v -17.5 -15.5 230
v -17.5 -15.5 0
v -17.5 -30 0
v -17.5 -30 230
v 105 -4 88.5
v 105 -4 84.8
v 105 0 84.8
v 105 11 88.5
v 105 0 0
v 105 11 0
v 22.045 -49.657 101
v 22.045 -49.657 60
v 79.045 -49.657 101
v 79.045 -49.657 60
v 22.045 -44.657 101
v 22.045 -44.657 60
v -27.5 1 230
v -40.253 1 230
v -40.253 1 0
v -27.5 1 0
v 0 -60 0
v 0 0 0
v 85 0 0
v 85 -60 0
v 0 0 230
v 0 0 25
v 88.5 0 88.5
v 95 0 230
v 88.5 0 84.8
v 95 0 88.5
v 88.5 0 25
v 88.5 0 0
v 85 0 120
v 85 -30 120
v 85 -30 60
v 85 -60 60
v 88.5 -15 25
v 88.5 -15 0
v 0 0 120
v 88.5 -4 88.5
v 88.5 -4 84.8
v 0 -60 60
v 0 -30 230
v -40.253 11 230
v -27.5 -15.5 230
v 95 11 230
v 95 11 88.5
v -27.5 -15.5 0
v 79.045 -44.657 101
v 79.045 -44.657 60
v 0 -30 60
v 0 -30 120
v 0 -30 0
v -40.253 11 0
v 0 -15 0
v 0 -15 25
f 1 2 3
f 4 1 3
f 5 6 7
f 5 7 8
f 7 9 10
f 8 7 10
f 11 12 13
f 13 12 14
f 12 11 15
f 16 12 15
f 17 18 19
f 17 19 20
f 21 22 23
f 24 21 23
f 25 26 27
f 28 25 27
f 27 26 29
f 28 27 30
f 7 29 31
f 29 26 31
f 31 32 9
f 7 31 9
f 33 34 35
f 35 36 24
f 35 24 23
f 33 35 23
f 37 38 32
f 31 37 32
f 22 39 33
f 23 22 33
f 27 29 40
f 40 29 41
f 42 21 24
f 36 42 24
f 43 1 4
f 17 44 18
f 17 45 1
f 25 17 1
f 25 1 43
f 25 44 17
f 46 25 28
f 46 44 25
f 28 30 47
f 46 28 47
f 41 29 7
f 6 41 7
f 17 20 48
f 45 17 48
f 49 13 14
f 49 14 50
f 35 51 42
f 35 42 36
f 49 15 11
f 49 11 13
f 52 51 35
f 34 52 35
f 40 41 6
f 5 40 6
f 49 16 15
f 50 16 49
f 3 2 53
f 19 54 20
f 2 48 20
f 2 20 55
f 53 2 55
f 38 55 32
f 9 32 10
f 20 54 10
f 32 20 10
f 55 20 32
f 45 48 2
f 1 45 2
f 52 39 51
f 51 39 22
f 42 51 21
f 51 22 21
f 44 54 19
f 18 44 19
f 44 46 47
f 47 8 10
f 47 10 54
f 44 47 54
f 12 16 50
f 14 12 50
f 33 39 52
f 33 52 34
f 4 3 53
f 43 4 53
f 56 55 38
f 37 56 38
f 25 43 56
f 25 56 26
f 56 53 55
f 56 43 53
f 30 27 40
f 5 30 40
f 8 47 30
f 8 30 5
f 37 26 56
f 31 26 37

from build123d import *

# Parameters (mm, degrees)
F0_W     = 10
F0_H     = 11
F1_DEPTH = 88.5
F2_START = 84.8
F2_DEPTH = 3.7
F3_DEPTH = 230
F4_DEPTH = 25
F5_W     = 85
F5_H     = 30
F6_DEPTH = 60
F7_DEPTH = 120
F8_W     = 57
F8_H     = 5
F9_DEPTH = 41


with BuildPart() as f1:
    # F0 (on Top) → F1 (new body)
    with BuildSketch(Plane.XY):
        Polygon((0, -15), (0, 0), (88.5, 0), (95, 0), (95, 11), (-40.2532453754, 11), (-40.2532453754, 1), (-27.5, 1), (-27.5, -15.5), (-17.5, -15.5), (-17.5, -30), (0, -30), align=None)
        with Locations((100, 5.5)):
            Rectangle(F0_W, F0_H)
    extrude(amount=F1_DEPTH)

    # F0 (on Top) → F2 (join)
    with BuildSketch(Plane.XY.offset(F2_START)):
        Polygon((95, 0), (88.5, 0), (88.5, -4), (105, -4), (105, 0), align=None)
    extrude(amount=F2_DEPTH)

    # F0 (on Top) → F3 (join)
    with BuildSketch(Plane.XY):
        Polygon((0, -15), (0, 0), (88.5, 0), (95, 0), (95, 11), (-40.2532453754, 11), (-40.2532453754, 1), (-27.5, 1), (-27.5, -15.5), (-17.5, -15.5), (-17.5, -30), (0, -30), align=None)
    extrude(amount=F3_DEPTH)

    # F0 (on Top) → F4 (join)
    with BuildSketch(Plane.XY):
        Polygon((88.5, 0), (0, 0), (0, -15), (88.5, -15), (88.5, -4), align=None)
    extrude(amount=F4_DEPTH)


with BuildPart() as f6:
    # F5 (on Top) → F6 (new body)
    with BuildSketch(Plane.XY):
        with Locations((42.5, -15)):
            Rectangle(F5_W, F5_H)
        with Locations((42.5, -45)):
            Rectangle(F5_W, F5_H)
    extrude(amount=F6_DEPTH)

    # F5 (on Top) → F7 (join)
    with BuildSketch(Plane.XY):
        with Locations((42.5, -15)):
            Rectangle(F5_W, F5_H)
    extrude(amount=F7_DEPTH)


with BuildPart() as f9:
    # F8 (on face) → F9 (new body)
    with BuildSketch(Plane.XY.offset(60)):
        with Locations((50.5448982381, -47.157112509)):
            Rectangle(F8_W, F8_H)
    extrude(amount=F9_DEPTH)


solid = Compound([f1.part, f6.part, f9.part])
